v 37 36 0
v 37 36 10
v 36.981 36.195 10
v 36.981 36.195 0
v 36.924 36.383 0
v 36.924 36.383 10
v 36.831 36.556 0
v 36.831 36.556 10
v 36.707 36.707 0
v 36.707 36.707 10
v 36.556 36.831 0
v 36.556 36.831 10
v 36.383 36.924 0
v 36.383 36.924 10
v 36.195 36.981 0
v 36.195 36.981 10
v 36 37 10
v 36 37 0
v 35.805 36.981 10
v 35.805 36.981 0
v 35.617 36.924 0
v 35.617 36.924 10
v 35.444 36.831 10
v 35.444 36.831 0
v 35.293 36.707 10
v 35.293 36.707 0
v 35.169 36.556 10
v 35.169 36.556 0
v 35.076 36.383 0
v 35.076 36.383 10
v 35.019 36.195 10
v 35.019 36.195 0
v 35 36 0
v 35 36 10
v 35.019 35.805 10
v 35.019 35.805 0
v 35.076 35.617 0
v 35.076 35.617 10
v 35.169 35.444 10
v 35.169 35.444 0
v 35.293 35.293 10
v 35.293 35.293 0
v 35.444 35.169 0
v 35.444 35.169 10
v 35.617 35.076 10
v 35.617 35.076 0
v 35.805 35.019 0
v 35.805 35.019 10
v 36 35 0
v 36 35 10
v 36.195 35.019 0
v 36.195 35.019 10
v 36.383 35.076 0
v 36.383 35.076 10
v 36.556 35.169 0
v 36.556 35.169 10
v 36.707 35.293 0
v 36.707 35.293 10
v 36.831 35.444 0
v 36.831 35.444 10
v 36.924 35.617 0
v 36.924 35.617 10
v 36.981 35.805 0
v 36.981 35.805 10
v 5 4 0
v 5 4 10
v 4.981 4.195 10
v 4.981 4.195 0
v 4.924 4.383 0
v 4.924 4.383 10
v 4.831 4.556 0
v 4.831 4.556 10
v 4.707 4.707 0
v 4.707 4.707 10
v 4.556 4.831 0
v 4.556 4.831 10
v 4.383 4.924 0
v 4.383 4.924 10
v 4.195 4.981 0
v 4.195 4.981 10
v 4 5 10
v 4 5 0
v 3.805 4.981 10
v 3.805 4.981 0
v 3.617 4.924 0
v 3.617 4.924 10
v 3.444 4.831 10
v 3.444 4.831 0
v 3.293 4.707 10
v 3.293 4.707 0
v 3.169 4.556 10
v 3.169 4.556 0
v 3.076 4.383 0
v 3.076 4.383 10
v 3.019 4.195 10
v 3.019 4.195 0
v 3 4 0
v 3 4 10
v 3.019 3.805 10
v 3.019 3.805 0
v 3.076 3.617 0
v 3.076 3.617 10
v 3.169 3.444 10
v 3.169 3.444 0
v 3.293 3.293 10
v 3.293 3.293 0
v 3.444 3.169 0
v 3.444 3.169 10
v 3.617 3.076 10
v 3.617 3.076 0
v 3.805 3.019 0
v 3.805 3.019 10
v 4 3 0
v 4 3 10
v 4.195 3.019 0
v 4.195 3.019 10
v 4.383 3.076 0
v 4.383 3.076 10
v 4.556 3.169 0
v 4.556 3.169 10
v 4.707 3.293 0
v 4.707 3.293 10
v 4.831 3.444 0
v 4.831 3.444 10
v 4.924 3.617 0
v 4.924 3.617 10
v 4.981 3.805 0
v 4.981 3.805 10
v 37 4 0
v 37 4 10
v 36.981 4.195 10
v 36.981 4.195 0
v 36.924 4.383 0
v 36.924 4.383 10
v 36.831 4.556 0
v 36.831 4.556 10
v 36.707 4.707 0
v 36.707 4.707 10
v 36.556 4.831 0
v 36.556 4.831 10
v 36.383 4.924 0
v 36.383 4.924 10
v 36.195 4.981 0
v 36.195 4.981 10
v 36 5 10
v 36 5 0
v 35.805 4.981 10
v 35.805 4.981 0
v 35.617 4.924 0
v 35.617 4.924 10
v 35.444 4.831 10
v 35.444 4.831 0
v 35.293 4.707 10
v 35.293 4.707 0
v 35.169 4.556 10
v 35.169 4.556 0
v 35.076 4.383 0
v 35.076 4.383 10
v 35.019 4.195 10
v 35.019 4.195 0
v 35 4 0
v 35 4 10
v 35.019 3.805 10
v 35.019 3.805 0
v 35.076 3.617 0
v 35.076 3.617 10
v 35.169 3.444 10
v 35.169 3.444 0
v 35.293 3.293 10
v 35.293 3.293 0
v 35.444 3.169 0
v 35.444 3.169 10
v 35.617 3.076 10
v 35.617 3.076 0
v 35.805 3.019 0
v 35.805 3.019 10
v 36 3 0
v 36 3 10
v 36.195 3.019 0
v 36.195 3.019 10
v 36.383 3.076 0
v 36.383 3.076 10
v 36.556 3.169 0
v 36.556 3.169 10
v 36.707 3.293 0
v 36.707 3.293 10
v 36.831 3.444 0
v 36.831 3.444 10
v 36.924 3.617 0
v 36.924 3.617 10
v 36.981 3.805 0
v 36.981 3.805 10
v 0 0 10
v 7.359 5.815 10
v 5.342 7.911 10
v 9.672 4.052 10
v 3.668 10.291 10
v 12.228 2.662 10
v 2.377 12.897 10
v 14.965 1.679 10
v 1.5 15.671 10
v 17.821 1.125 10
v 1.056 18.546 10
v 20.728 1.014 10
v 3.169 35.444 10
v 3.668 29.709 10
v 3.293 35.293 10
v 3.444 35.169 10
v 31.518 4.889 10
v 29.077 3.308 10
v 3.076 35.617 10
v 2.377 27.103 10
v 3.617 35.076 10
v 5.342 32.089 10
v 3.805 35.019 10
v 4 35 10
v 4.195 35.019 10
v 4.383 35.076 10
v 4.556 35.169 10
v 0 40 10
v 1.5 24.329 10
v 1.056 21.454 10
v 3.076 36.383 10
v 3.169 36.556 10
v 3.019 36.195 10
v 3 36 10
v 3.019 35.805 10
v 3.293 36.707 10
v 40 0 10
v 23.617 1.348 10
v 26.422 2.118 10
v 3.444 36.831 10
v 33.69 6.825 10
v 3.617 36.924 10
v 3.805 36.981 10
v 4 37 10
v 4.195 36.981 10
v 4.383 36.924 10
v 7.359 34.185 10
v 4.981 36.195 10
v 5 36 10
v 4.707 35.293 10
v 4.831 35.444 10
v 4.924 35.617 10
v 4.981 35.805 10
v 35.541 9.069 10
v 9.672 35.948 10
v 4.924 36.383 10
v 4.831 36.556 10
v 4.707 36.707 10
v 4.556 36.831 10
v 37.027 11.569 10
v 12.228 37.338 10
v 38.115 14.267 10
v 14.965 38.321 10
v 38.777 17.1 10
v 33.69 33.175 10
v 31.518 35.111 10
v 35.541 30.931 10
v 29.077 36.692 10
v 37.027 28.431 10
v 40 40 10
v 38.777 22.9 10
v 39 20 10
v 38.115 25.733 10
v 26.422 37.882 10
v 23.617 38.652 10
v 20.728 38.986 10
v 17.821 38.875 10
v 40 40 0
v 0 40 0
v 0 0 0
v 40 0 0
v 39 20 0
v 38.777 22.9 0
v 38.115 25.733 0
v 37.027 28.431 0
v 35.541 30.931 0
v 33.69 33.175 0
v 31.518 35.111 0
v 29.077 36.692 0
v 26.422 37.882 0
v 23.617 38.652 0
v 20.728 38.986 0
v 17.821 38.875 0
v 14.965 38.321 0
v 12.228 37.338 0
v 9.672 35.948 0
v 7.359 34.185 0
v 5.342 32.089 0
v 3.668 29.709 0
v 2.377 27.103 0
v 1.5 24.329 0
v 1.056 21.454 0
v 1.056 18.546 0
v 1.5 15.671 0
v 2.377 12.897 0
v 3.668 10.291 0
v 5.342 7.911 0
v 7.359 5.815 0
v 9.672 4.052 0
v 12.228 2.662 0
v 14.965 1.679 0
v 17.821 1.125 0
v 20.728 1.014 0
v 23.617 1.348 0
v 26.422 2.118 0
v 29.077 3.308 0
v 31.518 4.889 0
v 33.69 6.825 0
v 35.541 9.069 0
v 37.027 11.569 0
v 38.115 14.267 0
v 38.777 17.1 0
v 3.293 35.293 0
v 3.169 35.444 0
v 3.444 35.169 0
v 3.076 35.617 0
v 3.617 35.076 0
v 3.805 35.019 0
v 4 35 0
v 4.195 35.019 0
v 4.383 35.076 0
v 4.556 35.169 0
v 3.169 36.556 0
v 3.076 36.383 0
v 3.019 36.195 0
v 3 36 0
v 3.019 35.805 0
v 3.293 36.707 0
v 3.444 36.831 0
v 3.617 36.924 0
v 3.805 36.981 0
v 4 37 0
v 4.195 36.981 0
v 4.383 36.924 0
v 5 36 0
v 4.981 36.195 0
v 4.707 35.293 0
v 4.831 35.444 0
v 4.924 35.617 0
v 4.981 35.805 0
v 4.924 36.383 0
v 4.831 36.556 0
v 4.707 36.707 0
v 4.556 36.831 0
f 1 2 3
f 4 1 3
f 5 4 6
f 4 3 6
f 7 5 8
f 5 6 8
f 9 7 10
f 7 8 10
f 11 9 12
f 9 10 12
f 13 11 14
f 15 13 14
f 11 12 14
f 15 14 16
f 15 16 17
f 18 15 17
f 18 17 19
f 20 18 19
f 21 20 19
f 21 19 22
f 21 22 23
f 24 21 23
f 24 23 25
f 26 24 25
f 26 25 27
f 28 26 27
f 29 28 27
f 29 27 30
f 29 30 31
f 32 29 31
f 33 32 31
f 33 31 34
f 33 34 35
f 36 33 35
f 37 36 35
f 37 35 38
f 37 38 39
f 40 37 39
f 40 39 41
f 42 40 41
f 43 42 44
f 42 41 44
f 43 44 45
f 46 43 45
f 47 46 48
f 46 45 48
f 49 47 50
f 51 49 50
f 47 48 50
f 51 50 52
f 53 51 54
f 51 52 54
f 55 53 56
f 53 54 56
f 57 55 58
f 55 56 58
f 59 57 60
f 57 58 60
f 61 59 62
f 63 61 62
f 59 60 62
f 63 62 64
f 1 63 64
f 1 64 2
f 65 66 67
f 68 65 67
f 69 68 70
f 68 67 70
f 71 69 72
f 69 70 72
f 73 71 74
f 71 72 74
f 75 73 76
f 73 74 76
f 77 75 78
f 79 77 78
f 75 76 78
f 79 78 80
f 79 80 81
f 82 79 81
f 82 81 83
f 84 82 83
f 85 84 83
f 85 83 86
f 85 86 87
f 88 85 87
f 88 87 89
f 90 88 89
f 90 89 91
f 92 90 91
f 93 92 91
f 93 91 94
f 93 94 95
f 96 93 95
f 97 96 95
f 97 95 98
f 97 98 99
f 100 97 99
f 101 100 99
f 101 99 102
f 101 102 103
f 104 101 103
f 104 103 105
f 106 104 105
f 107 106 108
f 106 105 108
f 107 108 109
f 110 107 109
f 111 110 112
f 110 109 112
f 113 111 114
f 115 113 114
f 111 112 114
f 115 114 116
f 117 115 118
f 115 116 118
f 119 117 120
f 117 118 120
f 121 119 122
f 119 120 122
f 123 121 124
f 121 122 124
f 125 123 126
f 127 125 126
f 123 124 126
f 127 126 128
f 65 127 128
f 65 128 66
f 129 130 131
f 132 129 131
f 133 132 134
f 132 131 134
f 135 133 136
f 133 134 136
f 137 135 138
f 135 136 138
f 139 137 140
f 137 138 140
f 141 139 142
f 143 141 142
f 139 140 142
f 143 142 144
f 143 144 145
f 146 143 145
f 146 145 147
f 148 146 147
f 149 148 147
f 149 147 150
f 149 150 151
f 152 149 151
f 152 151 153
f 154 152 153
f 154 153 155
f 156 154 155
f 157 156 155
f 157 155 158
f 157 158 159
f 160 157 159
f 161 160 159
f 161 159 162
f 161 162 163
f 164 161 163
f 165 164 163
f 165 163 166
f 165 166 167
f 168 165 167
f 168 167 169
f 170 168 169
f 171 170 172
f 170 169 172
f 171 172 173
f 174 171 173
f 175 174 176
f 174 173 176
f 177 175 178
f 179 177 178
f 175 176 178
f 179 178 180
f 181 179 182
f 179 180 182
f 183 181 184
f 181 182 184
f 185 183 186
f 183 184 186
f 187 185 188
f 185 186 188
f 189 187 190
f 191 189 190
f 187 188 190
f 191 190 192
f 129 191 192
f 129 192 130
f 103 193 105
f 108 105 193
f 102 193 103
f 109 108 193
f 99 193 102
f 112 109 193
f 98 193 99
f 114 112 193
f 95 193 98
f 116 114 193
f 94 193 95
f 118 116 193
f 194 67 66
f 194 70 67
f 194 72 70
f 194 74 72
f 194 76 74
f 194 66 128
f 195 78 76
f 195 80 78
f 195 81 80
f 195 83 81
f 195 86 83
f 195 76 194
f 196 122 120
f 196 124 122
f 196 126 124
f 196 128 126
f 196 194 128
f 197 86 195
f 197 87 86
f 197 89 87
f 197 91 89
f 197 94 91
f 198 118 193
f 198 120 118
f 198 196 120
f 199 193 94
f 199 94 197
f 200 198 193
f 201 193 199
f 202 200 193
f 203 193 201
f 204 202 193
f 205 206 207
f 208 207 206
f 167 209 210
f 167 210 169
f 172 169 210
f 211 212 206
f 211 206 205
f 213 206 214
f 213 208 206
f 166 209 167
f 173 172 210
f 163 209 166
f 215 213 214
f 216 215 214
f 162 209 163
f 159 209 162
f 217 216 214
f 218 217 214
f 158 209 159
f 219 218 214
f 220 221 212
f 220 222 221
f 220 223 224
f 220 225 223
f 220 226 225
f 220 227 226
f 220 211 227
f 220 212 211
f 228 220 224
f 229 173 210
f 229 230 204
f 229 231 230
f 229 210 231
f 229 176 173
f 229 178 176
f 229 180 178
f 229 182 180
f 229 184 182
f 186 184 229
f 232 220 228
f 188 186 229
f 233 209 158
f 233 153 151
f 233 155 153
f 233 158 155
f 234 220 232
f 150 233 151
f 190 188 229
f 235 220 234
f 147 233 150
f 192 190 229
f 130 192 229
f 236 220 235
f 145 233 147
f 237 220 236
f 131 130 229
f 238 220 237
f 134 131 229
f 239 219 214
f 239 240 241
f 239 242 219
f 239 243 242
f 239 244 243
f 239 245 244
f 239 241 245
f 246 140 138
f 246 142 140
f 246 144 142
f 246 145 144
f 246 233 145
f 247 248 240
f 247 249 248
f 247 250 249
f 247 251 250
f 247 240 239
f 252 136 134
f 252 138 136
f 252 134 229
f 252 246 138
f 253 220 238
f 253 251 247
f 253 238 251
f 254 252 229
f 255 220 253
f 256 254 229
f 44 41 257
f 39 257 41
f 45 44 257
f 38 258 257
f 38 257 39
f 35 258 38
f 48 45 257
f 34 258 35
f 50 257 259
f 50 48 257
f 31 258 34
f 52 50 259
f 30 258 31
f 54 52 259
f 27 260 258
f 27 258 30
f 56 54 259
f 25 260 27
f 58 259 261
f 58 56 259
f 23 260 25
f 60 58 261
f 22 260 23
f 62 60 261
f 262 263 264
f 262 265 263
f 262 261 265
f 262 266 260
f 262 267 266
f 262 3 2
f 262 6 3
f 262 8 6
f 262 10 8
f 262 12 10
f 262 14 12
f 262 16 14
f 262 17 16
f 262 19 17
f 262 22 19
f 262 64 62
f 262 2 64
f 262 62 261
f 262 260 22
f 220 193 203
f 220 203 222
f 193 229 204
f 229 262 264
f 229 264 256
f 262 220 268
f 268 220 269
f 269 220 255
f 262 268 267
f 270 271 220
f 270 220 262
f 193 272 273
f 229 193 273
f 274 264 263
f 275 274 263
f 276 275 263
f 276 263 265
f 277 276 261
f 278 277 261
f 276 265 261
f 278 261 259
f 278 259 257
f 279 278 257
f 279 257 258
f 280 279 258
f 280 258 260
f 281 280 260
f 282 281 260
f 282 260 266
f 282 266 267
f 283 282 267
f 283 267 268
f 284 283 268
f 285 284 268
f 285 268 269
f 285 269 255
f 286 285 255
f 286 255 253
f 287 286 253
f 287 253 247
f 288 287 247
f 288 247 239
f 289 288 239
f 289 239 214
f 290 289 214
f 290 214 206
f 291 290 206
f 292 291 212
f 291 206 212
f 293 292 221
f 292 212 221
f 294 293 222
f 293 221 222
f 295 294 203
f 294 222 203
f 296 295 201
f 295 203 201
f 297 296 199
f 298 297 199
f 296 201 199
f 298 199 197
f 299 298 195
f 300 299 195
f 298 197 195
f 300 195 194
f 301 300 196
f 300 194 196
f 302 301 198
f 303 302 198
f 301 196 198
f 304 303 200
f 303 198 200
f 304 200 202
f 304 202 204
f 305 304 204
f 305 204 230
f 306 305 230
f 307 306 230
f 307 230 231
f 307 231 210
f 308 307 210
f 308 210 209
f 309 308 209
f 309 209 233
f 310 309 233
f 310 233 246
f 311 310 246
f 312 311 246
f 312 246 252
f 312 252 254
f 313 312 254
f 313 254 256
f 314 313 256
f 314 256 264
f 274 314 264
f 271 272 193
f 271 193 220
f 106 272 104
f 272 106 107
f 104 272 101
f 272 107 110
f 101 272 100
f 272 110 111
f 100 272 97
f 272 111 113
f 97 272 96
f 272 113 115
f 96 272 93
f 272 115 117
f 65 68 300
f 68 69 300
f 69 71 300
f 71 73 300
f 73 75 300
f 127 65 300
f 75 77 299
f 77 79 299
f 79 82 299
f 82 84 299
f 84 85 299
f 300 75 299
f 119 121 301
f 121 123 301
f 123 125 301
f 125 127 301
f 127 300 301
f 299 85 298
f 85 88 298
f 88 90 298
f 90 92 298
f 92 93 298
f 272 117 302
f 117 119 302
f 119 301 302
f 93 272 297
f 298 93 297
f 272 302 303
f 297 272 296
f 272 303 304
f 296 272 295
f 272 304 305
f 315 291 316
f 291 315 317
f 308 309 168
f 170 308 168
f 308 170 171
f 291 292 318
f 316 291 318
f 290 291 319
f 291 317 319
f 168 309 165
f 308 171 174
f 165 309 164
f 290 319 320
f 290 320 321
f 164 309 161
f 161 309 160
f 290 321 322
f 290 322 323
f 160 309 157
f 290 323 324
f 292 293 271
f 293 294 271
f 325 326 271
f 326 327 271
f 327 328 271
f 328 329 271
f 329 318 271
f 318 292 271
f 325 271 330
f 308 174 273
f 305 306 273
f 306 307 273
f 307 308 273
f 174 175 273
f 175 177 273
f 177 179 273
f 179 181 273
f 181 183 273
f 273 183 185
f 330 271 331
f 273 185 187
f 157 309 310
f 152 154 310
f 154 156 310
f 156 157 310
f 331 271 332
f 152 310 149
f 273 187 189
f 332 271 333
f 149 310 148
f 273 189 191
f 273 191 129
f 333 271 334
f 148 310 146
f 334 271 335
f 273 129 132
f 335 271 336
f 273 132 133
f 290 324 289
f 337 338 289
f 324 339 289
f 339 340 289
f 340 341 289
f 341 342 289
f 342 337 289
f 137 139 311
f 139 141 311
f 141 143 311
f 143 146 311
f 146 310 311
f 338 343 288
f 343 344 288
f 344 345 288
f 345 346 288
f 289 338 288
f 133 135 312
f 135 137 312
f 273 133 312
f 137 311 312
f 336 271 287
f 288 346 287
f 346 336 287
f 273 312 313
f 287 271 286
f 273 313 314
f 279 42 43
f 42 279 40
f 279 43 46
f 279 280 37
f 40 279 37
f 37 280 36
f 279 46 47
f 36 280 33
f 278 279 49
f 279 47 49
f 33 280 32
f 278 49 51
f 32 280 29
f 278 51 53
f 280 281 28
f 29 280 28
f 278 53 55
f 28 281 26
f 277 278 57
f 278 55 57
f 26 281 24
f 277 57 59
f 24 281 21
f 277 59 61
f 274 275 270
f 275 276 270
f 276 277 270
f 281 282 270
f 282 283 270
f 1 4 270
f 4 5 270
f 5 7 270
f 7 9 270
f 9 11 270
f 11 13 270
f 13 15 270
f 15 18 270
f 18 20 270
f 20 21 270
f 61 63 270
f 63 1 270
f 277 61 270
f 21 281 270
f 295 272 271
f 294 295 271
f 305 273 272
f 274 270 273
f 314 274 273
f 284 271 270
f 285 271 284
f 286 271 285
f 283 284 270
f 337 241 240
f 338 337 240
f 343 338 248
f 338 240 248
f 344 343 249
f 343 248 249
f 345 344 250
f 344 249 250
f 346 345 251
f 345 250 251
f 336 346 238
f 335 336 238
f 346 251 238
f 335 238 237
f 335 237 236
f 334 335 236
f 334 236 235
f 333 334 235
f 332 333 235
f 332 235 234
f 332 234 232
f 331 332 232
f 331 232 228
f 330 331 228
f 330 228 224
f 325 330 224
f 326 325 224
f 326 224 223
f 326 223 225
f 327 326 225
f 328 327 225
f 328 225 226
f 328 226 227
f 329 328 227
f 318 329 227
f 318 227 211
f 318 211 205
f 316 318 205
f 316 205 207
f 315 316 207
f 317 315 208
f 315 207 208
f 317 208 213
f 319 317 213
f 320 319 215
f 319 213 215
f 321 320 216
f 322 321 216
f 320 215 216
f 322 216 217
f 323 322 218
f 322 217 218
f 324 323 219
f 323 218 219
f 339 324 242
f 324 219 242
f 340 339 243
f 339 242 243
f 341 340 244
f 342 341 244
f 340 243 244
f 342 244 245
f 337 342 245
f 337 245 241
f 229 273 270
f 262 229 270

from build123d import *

# Parameters (mm, degrees)
SKETCH1_W           = 40
SKETCH1_H           = 40
BOSS_EXTRUDE1_DEPTH = 10
SKETCH2_R           = 1
CUT_EXTRUDE1_DEPTH  = 11
SKETCH3_R           = 19
CUT_EXTRUDE2_DEPTH  = 11


with BuildPart() as part:
    # Sketch1 → Boss-Extrude1 (new body)
    with BuildSketch(Plane.XY):
        with Locations((20, 20)):
            Rectangle(SKETCH1_W, SKETCH1_H)
    extrude(amount=BOSS_EXTRUDE1_DEPTH)

    # Sketch2 → Cut-Extrude1 (cut, through all)
    with BuildSketch(Plane.XY.offset(10)):
        with Locations((36, 36)):
            Circle(SKETCH2_R)
        with Locations((4, 36)):
            Circle(SKETCH2_R)
        with Locations((4, 4)):
            Circle(SKETCH2_R)
        with Locations((36, 4)):
            Circle(SKETCH2_R)
    extrude(amount=-CUT_EXTRUDE1_DEPTH, mode=Mode.SUBTRACT)

    # Sketch3 → Cut-Extrude2 (cut, through all)
    with BuildSketch(Plane.XY.offset(10)):
        with Locations((20, 20)):
            Circle(SKETCH3_R)
    extrude(amount=-CUT_EXTRUDE2_DEPTH, mode=Mode.SUBTRACT)


solid = part.part
